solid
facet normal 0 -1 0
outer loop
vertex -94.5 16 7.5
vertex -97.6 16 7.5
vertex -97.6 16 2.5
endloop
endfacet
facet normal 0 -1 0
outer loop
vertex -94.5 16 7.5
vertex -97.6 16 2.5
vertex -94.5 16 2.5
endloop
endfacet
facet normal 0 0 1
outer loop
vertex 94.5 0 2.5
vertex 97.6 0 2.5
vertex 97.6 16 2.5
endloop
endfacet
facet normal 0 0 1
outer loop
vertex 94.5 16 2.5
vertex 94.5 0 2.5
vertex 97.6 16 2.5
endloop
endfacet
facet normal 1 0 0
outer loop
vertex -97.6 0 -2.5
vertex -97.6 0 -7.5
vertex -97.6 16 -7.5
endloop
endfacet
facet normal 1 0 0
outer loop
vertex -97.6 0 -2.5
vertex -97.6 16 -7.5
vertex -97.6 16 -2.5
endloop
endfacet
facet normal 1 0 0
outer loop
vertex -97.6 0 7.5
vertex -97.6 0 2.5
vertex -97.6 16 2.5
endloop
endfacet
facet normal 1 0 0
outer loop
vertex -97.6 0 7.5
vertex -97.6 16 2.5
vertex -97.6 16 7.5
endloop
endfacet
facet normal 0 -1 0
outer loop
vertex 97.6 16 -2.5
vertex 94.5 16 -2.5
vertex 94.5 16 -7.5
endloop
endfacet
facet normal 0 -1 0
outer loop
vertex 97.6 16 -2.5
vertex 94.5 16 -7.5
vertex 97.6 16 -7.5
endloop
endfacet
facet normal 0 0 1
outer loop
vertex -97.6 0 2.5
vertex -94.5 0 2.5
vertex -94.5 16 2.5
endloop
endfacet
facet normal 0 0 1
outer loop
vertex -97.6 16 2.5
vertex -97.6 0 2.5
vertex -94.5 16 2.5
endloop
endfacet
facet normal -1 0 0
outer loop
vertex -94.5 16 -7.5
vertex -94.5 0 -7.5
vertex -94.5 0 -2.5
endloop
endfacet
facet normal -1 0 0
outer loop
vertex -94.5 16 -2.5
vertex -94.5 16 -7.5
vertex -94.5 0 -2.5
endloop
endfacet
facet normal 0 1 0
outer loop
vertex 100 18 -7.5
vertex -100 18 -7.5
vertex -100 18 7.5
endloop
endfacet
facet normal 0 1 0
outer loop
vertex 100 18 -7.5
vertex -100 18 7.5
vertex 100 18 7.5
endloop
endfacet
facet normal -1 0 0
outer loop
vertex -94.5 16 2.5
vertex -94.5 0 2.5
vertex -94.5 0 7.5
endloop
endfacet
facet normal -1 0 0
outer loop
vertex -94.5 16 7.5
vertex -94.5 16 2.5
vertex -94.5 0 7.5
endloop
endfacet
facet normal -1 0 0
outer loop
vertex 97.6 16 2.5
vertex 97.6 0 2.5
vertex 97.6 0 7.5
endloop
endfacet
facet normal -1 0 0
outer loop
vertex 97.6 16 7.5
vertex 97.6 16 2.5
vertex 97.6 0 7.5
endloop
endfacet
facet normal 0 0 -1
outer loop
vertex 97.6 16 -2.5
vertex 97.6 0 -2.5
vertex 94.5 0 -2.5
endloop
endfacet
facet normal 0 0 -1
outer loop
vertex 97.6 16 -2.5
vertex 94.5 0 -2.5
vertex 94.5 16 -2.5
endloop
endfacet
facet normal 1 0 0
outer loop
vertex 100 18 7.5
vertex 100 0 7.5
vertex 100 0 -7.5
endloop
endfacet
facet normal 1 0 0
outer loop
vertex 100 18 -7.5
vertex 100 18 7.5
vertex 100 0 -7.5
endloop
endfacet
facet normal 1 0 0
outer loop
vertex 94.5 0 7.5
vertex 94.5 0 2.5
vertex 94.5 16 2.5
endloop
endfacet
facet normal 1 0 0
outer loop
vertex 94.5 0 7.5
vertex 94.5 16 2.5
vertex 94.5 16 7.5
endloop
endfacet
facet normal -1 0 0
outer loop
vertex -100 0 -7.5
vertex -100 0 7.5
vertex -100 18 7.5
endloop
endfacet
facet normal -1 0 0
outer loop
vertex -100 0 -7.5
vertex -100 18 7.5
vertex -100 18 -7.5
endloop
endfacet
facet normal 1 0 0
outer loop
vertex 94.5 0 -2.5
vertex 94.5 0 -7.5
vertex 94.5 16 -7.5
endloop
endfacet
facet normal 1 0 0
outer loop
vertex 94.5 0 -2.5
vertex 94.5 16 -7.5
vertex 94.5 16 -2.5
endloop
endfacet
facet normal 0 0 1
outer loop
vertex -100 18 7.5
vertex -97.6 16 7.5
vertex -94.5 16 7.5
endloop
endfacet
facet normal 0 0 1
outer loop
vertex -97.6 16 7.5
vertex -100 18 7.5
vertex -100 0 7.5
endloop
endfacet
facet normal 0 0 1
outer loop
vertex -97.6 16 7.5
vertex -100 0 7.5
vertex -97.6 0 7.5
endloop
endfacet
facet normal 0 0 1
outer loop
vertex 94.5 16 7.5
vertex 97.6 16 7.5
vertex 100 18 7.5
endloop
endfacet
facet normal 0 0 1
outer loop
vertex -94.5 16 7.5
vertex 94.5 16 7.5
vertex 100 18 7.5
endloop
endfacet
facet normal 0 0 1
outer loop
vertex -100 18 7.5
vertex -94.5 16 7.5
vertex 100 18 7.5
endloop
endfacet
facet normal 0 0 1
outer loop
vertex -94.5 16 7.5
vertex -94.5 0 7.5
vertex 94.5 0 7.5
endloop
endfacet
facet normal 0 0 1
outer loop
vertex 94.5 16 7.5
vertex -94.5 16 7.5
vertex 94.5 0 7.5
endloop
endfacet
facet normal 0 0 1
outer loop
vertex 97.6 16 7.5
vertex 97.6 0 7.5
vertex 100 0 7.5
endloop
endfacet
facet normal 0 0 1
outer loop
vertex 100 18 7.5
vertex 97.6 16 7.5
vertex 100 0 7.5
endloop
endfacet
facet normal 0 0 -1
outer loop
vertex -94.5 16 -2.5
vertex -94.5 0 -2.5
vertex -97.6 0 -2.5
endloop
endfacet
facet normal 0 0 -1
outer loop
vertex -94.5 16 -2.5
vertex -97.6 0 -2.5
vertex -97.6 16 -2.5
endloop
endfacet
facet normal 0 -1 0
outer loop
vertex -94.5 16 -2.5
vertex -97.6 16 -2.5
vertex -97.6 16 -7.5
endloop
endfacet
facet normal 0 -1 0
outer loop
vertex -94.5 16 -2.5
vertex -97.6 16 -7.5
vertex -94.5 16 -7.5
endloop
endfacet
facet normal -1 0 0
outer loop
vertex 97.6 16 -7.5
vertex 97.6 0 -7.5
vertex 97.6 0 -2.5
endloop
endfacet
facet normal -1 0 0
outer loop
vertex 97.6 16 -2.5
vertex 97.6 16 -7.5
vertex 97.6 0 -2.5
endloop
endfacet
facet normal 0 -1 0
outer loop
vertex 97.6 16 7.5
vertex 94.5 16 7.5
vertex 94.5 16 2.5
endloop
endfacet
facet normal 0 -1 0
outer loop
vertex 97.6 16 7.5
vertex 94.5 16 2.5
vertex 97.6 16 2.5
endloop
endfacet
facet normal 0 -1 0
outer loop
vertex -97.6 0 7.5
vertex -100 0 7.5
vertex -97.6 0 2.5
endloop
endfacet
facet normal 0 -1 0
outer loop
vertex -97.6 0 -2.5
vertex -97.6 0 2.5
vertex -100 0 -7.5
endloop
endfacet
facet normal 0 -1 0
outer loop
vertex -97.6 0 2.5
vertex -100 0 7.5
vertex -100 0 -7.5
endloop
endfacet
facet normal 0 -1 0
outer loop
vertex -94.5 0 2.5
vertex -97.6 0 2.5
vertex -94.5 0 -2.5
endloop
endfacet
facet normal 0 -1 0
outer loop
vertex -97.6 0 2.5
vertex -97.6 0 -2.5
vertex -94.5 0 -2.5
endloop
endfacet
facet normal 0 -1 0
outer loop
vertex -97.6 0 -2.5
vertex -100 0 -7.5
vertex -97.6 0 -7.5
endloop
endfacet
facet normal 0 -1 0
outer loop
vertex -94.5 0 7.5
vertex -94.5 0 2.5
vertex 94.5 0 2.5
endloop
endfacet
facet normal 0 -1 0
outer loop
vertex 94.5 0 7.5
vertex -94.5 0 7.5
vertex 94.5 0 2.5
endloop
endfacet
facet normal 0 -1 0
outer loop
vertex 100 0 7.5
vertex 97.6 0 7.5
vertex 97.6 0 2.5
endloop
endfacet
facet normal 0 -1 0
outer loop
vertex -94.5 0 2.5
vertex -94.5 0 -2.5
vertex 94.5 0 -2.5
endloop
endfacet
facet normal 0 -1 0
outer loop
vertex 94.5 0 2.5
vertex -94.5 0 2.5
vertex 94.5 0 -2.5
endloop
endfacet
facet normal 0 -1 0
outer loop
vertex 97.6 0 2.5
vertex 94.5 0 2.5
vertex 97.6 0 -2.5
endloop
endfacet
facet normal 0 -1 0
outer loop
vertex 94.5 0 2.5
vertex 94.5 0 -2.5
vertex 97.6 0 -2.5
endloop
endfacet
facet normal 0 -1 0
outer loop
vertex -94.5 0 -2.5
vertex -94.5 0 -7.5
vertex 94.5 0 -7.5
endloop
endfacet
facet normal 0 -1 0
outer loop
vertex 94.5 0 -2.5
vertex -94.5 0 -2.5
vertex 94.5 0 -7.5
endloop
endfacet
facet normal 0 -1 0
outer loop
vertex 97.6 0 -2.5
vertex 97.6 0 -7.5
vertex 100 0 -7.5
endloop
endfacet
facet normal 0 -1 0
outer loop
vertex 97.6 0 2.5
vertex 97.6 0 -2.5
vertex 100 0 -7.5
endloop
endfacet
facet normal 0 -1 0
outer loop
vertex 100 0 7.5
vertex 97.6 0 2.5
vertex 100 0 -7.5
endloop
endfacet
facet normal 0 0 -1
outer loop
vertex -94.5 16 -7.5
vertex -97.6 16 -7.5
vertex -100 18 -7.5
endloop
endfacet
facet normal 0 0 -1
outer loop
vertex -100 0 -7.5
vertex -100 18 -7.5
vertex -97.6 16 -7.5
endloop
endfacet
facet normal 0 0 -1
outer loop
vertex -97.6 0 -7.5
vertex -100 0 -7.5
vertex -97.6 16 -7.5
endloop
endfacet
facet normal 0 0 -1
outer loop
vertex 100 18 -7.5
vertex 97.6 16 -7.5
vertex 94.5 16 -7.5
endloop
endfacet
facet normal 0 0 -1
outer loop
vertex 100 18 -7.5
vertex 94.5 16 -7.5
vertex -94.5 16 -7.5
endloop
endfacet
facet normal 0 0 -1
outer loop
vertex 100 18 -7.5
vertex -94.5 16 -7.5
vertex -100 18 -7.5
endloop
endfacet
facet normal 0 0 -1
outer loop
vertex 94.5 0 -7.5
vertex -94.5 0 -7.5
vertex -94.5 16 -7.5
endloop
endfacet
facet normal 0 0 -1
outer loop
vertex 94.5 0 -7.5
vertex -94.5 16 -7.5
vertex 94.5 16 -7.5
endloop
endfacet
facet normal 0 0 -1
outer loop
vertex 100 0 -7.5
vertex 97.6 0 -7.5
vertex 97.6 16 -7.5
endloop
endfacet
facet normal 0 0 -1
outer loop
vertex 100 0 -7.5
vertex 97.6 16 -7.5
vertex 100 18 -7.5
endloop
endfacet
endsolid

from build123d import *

# Parameters (mm, degrees)
SKETCH1_W               = 200
SKETCH1_H               = 15
FRONT_TOP_BEAM_DEPTH    = 18
SKETCH2_W               = 3.1
SKETCH2_H               = 15
FRONT_TOP_GROOVES_DEPTH = 16
FRONT_TOP_RIB_REACH     = 202.948
SKETCH3_W               = 5
SKETCH3_H               = 18


with BuildPart() as part:
    # Sketch1 → Front Top Beam (new body)
    with BuildSketch(Plane(origin=(0, 0, 0), x_dir=(1, 0, 0), z_dir=(0, 1, 0))):
        Rectangle(SKETCH1_W, SKETCH1_H)
    extrude(amount=FRONT_TOP_BEAM_DEPTH)

    # Sketch2 → Front Top Grooves (cut)
    with BuildSketch(Plane.XZ):
        with Locations((-96.05, 0)):
            Rectangle(SKETCH2_W, SKETCH2_H)
        with Locations((96.05, 0)):
            Rectangle(SKETCH2_W, SKETCH2_H)
    extrude(amount=-FRONT_TOP_GROOVES_DEPTH, mode=Mode.SUBTRACT)

    # Sketch3 → Front Top Rib (add, up to next)
    with BuildSketch(Plane(origin=(100, 0, 0), x_dir=(0, 0, -1), z_dir=(1, 0, 0)), mode=Mode.PRIVATE) as front_top_rib_sk1:
        with Locations((0, 9)):
            Rectangle(SKETCH3_W, SKETCH3_H)
    front_top_rib_tool1 = extrude(front_top_rib_sk1.sketch, amount=-FRONT_TOP_RIB_REACH, mode=Mode.PRIVATE) - part.part
    add(front_top_rib_tool1.solids().sort_by_distance((100, 9, 0))[0])
    add(front_top_rib_tool1.solids().sort_by_distance((100, 9, 0))[1])


solid = part.part
